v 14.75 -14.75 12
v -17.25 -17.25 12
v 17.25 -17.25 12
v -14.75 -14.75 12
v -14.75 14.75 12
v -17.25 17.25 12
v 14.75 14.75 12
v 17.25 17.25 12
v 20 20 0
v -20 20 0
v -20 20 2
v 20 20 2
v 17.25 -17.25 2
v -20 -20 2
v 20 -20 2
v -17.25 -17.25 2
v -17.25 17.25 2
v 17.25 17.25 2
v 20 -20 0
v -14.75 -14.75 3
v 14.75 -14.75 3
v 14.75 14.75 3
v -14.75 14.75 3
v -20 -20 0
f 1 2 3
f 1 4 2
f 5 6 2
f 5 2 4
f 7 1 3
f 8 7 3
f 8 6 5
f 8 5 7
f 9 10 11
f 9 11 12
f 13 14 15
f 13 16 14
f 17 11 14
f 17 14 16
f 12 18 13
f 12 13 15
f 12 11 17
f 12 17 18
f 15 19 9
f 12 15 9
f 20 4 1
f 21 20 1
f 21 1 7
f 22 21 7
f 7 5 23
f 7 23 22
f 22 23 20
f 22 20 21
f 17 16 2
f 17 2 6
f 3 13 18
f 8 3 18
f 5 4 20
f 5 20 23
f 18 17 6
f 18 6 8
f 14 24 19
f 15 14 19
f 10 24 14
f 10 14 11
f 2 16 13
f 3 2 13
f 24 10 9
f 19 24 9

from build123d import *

# Parameters (mm, degrees)
SKETCH_W     = 40
SKETCH_H     = 40
PAD_DEPTH    = 2
SKETCH001_W  = 34.5
SKETCH001_H  = 34.5
PAD001_DEPTH = 10
SKETCH002_W  = 29.5
SKETCH002_H  = 29.5
POCKET_DEPTH = 9


with BuildPart() as part:
    # Sketch → Pad (new body)
    with BuildSketch(Plane.XY):
        Rectangle(SKETCH_W, SKETCH_H)
    extrude(amount=PAD_DEPTH)

    # Sketch001 (on Face6 of Pad) → Pad001 (join)
    with BuildSketch(Plane.XY.offset(2)):
        Rectangle(SKETCH001_W, SKETCH001_H)
    extrude(amount=PAD001_DEPTH)

    # Sketch002 (on Face11 of Pad001) → Pocket (cut)
    with BuildSketch(Plane.XY.offset(12)):
        Rectangle(SKETCH002_W, SKETCH002_H)
    extrude(amount=-POCKET_DEPTH, mode=Mode.SUBTRACT)


solid = part.part
